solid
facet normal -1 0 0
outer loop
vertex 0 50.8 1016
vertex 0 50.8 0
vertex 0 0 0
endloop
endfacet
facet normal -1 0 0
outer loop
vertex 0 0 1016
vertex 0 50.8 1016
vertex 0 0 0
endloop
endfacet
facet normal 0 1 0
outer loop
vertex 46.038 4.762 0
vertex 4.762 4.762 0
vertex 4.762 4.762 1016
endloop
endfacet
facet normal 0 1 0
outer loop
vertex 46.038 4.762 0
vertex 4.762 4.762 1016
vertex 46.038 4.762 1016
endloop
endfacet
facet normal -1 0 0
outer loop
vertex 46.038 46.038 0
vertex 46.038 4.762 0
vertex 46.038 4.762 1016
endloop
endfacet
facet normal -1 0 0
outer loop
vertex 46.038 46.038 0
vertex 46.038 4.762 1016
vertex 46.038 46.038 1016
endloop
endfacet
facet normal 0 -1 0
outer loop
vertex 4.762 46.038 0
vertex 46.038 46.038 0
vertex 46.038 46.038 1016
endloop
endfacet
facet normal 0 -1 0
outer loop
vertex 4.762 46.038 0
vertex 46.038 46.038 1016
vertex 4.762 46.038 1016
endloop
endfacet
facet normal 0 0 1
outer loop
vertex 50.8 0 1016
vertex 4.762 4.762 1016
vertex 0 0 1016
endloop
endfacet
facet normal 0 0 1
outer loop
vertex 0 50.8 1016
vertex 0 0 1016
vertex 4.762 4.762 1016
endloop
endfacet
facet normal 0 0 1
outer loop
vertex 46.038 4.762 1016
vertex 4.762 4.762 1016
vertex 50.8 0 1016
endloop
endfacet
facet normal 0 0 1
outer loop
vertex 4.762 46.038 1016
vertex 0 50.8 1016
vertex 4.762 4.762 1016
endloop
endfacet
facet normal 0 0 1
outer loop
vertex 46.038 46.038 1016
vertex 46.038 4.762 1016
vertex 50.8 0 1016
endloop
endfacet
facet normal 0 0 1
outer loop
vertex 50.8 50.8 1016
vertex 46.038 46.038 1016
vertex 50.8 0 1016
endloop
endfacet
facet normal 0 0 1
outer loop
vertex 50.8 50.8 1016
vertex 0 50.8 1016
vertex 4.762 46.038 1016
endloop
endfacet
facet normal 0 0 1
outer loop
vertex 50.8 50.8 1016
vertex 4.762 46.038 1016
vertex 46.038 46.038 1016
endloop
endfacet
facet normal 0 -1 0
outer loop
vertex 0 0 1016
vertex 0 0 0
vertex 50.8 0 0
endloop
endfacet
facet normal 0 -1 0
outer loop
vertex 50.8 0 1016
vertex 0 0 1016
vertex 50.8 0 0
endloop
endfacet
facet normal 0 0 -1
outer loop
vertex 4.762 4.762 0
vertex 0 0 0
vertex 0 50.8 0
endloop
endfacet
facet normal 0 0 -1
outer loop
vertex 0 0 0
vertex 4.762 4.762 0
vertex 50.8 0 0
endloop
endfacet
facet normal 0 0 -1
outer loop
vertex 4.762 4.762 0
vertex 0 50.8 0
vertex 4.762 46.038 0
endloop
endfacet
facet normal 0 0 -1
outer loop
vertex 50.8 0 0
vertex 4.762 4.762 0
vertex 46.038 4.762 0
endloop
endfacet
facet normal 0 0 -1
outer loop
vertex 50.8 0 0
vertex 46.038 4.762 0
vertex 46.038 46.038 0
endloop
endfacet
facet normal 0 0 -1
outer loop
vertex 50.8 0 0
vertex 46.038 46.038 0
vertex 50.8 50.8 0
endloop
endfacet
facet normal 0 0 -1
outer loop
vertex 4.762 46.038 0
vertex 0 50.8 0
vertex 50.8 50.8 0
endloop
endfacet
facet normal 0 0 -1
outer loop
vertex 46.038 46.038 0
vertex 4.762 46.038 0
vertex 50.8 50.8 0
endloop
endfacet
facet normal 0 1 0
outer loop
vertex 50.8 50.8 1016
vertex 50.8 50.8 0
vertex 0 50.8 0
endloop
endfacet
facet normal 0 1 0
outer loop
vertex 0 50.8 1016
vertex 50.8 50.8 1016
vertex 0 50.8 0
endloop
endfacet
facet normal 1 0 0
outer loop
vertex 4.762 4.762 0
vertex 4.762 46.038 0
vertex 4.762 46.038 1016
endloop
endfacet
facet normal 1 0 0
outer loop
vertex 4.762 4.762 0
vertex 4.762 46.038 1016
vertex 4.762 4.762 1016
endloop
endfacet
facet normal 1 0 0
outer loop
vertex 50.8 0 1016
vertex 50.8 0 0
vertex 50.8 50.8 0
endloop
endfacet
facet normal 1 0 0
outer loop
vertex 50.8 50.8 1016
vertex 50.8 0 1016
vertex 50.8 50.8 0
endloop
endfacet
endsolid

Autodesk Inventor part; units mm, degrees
ref_plane "YZ Plane" through (0, 0, 0) normal (1, 0, 0) x (0, 1, 0)
ref_plane "XZ Plane" through (0, 0, 0) normal (0, 1, 0) x (-1, 0, 0)
ref_plane "XY Plane" through (0, 0, 0) normal (0, 0, 1) x (1, 0, 0)
sketch "Sketch1" plane through (0, 0, 0) normal (0, 0, 1) x (1, 0, 0)
  line L0 (0, 0) -> (50.8, 0)
  line L1 (50.8, 0) -> (50.8, 50.8)
  line L2 (50.8, 50.8) -> (0, 50.8)
  line L3 (0, 50.8) -> (0, 0)
  line L4 (0, 0) -> (4.7625, 0) construction
  line L5 (4.7625, 0) -> (4.7625, 4.7625) construction
  line L6 (4.7625, 4.7625) -> (0, 4.7625) construction
  line L7 (0, 4.7625) -> (0, 0) construction
  line L8 (50.8, 50.8) -> (46.0375, 50.8) construction
  line L9 (46.0375, 50.8) -> (46.0375, 46.0375) construction
  line L10 (46.0375, 46.0375) -> (50.8, 46.0375) construction
  line L11 (50.8, 46.0375) -> (50.8, 50.8) construction
  line L12 (46.0375, 46.0375) -> (4.7625, 46.0375)
  line L13 (4.7625, 46.0375) -> (4.7625, 4.7625)
  line L14 (4.7625, 4.7625) -> (46.0375, 4.7625)
  line L15 (46.0375, 4.7625) -> (46.0375, 46.0375)
  dimension "d0" = 50.8
  dimension "d1" = 50.8
  dimension "d2" = 4.7625
  dimension "d3" = 4.7625
  dimension "d4" = 4.7625
  dimension "d5" = 4.7625
extrude "Extrusion1" add sketch "Sketch1" along normal blind 1016
equation "\"d0\" = d1"
equation "\"d2\" = d3"
equation "\"d4\" = d3"
equation "\"d5\" = d3"
properties part number "40in2.0Sq" material "Steel, Mild"
